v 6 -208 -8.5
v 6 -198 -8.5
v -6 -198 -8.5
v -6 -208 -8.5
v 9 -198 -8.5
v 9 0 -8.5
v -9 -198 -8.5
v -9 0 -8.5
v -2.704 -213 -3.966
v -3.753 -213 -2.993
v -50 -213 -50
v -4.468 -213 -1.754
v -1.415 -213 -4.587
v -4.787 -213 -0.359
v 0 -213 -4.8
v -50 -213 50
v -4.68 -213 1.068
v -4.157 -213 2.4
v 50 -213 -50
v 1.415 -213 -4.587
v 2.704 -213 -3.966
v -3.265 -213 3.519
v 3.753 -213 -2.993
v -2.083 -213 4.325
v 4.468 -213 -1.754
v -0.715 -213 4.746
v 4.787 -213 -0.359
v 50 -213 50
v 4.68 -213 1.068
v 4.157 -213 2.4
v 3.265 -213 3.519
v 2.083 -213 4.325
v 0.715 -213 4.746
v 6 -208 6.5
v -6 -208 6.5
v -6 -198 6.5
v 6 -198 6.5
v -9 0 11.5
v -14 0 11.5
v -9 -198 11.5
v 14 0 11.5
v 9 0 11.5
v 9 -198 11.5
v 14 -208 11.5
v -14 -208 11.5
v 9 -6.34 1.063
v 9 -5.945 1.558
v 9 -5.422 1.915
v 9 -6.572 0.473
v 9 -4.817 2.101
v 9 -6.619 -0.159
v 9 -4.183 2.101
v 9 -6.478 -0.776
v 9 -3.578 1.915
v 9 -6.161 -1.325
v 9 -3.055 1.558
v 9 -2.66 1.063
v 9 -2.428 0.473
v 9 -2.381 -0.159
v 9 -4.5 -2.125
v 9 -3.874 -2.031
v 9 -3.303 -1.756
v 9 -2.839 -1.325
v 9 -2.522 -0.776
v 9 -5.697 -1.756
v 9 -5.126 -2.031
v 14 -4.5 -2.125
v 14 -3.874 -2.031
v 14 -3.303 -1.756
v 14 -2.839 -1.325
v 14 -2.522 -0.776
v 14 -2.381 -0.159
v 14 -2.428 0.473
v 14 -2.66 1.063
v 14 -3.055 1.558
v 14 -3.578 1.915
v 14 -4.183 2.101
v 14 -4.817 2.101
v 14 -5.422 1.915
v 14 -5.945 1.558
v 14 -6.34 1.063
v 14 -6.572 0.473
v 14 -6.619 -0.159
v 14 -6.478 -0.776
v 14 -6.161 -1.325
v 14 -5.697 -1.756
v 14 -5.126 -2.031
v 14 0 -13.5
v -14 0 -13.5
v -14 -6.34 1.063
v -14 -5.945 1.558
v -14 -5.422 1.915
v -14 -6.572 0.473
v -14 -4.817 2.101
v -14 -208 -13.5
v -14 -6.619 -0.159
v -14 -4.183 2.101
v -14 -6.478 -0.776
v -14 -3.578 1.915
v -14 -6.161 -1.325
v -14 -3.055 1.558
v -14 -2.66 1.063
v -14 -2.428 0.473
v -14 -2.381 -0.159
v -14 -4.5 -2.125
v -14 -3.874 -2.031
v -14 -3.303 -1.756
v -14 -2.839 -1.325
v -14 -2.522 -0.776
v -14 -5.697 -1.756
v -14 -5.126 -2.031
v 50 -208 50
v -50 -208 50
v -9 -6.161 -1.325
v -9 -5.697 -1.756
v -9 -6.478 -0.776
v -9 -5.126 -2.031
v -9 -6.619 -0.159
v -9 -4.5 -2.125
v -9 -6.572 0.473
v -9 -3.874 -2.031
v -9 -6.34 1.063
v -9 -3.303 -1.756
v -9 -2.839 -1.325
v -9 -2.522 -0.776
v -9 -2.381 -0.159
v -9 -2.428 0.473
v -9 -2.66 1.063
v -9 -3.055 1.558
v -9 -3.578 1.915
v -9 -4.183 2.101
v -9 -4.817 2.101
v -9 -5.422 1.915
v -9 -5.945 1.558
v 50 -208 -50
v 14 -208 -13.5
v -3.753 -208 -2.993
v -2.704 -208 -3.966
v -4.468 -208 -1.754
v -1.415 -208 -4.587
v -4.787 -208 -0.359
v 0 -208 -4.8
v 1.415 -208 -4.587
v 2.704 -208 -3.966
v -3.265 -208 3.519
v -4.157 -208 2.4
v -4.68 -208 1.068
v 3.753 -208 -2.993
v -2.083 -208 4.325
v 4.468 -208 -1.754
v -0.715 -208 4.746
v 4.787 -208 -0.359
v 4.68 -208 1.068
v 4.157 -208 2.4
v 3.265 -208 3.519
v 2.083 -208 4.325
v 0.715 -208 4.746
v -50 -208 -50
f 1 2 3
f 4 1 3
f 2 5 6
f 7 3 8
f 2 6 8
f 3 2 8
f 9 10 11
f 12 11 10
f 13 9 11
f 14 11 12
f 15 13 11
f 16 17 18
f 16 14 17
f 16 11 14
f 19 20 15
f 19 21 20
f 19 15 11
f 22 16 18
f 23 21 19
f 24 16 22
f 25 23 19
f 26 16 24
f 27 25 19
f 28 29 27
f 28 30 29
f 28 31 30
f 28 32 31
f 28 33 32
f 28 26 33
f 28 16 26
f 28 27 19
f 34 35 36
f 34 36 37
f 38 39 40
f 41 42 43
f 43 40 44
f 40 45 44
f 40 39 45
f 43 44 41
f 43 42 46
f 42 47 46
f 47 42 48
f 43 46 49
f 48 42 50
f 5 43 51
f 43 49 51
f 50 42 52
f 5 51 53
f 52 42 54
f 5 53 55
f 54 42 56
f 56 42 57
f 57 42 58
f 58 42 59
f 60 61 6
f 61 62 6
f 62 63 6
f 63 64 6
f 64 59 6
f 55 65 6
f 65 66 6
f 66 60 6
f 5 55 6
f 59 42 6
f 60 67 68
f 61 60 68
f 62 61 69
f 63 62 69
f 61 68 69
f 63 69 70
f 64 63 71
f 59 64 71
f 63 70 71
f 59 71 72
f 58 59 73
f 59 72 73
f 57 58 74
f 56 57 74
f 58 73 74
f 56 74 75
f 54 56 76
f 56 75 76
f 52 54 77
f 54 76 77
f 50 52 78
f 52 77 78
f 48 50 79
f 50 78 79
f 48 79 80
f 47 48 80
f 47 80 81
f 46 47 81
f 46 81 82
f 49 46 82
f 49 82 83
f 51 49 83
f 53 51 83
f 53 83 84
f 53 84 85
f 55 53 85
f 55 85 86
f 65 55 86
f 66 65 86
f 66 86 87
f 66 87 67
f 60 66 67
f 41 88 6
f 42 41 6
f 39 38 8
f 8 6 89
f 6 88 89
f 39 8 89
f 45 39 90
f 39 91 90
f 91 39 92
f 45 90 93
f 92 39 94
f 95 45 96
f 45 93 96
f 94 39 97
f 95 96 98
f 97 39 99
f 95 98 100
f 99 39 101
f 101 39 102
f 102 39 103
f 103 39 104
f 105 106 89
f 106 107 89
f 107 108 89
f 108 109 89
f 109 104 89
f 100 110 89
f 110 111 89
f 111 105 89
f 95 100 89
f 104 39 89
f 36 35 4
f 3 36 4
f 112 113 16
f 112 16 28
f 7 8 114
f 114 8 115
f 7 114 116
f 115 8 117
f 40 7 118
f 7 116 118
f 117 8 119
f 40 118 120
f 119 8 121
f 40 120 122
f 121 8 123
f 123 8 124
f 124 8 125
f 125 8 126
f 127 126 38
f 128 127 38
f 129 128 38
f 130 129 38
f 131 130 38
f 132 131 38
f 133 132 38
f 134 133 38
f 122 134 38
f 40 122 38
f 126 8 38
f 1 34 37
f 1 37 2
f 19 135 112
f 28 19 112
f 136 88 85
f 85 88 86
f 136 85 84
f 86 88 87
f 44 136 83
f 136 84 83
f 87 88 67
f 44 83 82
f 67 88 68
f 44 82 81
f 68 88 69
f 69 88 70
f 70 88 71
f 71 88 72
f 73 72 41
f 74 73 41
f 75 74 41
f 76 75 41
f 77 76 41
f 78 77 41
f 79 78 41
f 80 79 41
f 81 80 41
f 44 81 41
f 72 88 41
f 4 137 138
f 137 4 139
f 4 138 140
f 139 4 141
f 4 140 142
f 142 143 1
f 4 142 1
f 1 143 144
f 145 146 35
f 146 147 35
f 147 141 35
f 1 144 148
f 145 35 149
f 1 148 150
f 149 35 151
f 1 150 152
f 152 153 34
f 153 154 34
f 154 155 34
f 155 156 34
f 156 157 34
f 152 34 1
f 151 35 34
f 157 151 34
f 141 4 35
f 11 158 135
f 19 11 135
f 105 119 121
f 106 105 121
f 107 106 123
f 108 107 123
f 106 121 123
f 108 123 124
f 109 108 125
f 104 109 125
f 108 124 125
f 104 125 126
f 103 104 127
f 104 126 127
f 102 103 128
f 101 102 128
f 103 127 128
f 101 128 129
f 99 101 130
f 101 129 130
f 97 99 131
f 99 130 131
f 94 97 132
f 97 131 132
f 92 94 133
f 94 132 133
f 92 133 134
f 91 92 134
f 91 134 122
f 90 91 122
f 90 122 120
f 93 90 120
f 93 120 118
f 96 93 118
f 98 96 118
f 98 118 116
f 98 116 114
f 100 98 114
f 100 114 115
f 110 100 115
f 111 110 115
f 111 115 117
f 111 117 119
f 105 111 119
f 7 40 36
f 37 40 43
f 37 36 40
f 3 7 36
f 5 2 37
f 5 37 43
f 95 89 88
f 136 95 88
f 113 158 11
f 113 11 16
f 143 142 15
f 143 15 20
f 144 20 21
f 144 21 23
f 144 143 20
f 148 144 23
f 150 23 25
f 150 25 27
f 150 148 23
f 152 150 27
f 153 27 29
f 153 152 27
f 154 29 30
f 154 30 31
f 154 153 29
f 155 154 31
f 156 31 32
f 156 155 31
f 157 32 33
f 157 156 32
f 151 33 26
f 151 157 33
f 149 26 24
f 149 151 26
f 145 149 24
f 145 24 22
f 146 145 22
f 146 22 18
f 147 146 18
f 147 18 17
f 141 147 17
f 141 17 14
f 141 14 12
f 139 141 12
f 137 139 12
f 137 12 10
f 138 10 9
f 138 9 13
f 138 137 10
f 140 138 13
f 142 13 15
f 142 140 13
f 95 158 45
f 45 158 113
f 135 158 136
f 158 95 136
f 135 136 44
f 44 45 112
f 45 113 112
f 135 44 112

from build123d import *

# Parameters (mm, degrees)
BOSS_EXTRUDE2_DEPTH = 208
CUT_EXTRUDE1_REACH  = 212.31
SKETCH5_R           = 2.125
SKETCH6_W           = 100
SKETCH6_H           = 100
BOSS_EXTRUDE5_DEPTH = 5
CUT_EXTRUDE2_REACH  = 221.691
SKETCH7_R           = 4.5
SKETCH8_W           = 18
SKETCH8_H           = 23
SKETCH8_W_2         = 12
SKETCH8_H_2         = 15.5
BOSS_EXTRUDE6_DEPTH = 10
CUT_EXTRUDE7_START  = -5
SKETCH10_R          = 4.8
SKETCH10_R_2        = 4.5
CUT_EXTRUDE7_DEPTH  = 5


with BuildPart() as part:
    # Sketch3 → Boss-Extrude2 (new body)
    with BuildSketch(Plane(origin=(0, 0, 0), x_dir=(1, 0, 0), z_dir=(0, 1, 0))):
        Polygon((9, 8.5), (-9, 8.5), (-9, -11.5), (-14, -11.5), (-14, 13.5), (14, 13.5), (14, -11.5), (9, -11.5), align=None)
    extrude(amount=-BOSS_EXTRUDE2_DEPTH)

    # Cut-Extrude1: up to this face of the body (flat: up to its plane)
    cut_extrude1_end = Plane(part.part.faces().sort_by_distance((-14, -104, -1))[0])
    # Sketch5 → Cut-Extrude1 (cut, up to the picked face)
    with BuildSketch(Plane(origin=(14, 0, 0), x_dir=(0, 0, -1), z_dir=(1, 0, 0)), mode=Mode.PRIVATE) as cut_extrude1_sk1:
        with Locations((0, -4.5)):
            Circle(SKETCH5_R)
    cut_extrude1_tool1 = split(extrude(cut_extrude1_sk1.sketch, amount=-CUT_EXTRUDE1_REACH, mode=Mode.PRIVATE), bisect_by=cut_extrude1_end, keep=Keep.BOTH, mode=Mode.PRIVATE)
    add(cut_extrude1_tool1.solids().sort_by(Axis((14, -4.5, 0), (-1, 0, 0)))[0], mode=Mode.SUBTRACT)

    # Sketch6 → Boss-Extrude5 (add)
    with BuildSketch(Plane.XZ.offset(208)):
        Rectangle(SKETCH6_W, SKETCH6_H)
    extrude(amount=BOSS_EXTRUDE5_DEPTH)

    # Sketch7 → Cut-Extrude2 (cut, up to next)
    with BuildSketch(Plane(origin=(0, -208, 0), x_dir=(1, 0, 0), z_dir=(0, 1, 0)), mode=Mode.PRIVATE) as cut_extrude2_sk1:
        with Locations(Location((0, 0, 0), (0, 0, 270))):
            Circle(SKETCH7_R)
    cut_extrude2_tool1 = extrude(cut_extrude2_sk1.sketch, amount=-CUT_EXTRUDE2_REACH, mode=Mode.PRIVATE) & part.part
    add(cut_extrude2_tool1.solids().sort_by_distance((0, -208, 0))[0], mode=Mode.SUBTRACT)

    # Sketch8 → Boss-Extrude6 (add)
    with BuildSketch(Plane(origin=(0, -208, 0), x_dir=(1, 0, 0), z_dir=(0, 1, 0))):
        Rectangle(SKETCH8_W, SKETCH8_H)
        with Locations((0, 1.25)):
            Rectangle(SKETCH8_W_2, SKETCH8_H_2, mode=Mode.SUBTRACT)
    extrude(amount=BOSS_EXTRUDE6_DEPTH)

    # Sketch10 → Cut-Extrude7 (cut)
    with BuildSketch(Plane.XZ.offset(213).offset(CUT_EXTRUDE7_START)):
        with Locations(Location((0, 0, 0), (0, 0, 270))):
            Circle(SKETCH10_R)
        Circle(SKETCH10_R_2, mode=Mode.SUBTRACT)
    extrude(amount=CUT_EXTRUDE7_DEPTH, mode=Mode.SUBTRACT)


solid = part.part
